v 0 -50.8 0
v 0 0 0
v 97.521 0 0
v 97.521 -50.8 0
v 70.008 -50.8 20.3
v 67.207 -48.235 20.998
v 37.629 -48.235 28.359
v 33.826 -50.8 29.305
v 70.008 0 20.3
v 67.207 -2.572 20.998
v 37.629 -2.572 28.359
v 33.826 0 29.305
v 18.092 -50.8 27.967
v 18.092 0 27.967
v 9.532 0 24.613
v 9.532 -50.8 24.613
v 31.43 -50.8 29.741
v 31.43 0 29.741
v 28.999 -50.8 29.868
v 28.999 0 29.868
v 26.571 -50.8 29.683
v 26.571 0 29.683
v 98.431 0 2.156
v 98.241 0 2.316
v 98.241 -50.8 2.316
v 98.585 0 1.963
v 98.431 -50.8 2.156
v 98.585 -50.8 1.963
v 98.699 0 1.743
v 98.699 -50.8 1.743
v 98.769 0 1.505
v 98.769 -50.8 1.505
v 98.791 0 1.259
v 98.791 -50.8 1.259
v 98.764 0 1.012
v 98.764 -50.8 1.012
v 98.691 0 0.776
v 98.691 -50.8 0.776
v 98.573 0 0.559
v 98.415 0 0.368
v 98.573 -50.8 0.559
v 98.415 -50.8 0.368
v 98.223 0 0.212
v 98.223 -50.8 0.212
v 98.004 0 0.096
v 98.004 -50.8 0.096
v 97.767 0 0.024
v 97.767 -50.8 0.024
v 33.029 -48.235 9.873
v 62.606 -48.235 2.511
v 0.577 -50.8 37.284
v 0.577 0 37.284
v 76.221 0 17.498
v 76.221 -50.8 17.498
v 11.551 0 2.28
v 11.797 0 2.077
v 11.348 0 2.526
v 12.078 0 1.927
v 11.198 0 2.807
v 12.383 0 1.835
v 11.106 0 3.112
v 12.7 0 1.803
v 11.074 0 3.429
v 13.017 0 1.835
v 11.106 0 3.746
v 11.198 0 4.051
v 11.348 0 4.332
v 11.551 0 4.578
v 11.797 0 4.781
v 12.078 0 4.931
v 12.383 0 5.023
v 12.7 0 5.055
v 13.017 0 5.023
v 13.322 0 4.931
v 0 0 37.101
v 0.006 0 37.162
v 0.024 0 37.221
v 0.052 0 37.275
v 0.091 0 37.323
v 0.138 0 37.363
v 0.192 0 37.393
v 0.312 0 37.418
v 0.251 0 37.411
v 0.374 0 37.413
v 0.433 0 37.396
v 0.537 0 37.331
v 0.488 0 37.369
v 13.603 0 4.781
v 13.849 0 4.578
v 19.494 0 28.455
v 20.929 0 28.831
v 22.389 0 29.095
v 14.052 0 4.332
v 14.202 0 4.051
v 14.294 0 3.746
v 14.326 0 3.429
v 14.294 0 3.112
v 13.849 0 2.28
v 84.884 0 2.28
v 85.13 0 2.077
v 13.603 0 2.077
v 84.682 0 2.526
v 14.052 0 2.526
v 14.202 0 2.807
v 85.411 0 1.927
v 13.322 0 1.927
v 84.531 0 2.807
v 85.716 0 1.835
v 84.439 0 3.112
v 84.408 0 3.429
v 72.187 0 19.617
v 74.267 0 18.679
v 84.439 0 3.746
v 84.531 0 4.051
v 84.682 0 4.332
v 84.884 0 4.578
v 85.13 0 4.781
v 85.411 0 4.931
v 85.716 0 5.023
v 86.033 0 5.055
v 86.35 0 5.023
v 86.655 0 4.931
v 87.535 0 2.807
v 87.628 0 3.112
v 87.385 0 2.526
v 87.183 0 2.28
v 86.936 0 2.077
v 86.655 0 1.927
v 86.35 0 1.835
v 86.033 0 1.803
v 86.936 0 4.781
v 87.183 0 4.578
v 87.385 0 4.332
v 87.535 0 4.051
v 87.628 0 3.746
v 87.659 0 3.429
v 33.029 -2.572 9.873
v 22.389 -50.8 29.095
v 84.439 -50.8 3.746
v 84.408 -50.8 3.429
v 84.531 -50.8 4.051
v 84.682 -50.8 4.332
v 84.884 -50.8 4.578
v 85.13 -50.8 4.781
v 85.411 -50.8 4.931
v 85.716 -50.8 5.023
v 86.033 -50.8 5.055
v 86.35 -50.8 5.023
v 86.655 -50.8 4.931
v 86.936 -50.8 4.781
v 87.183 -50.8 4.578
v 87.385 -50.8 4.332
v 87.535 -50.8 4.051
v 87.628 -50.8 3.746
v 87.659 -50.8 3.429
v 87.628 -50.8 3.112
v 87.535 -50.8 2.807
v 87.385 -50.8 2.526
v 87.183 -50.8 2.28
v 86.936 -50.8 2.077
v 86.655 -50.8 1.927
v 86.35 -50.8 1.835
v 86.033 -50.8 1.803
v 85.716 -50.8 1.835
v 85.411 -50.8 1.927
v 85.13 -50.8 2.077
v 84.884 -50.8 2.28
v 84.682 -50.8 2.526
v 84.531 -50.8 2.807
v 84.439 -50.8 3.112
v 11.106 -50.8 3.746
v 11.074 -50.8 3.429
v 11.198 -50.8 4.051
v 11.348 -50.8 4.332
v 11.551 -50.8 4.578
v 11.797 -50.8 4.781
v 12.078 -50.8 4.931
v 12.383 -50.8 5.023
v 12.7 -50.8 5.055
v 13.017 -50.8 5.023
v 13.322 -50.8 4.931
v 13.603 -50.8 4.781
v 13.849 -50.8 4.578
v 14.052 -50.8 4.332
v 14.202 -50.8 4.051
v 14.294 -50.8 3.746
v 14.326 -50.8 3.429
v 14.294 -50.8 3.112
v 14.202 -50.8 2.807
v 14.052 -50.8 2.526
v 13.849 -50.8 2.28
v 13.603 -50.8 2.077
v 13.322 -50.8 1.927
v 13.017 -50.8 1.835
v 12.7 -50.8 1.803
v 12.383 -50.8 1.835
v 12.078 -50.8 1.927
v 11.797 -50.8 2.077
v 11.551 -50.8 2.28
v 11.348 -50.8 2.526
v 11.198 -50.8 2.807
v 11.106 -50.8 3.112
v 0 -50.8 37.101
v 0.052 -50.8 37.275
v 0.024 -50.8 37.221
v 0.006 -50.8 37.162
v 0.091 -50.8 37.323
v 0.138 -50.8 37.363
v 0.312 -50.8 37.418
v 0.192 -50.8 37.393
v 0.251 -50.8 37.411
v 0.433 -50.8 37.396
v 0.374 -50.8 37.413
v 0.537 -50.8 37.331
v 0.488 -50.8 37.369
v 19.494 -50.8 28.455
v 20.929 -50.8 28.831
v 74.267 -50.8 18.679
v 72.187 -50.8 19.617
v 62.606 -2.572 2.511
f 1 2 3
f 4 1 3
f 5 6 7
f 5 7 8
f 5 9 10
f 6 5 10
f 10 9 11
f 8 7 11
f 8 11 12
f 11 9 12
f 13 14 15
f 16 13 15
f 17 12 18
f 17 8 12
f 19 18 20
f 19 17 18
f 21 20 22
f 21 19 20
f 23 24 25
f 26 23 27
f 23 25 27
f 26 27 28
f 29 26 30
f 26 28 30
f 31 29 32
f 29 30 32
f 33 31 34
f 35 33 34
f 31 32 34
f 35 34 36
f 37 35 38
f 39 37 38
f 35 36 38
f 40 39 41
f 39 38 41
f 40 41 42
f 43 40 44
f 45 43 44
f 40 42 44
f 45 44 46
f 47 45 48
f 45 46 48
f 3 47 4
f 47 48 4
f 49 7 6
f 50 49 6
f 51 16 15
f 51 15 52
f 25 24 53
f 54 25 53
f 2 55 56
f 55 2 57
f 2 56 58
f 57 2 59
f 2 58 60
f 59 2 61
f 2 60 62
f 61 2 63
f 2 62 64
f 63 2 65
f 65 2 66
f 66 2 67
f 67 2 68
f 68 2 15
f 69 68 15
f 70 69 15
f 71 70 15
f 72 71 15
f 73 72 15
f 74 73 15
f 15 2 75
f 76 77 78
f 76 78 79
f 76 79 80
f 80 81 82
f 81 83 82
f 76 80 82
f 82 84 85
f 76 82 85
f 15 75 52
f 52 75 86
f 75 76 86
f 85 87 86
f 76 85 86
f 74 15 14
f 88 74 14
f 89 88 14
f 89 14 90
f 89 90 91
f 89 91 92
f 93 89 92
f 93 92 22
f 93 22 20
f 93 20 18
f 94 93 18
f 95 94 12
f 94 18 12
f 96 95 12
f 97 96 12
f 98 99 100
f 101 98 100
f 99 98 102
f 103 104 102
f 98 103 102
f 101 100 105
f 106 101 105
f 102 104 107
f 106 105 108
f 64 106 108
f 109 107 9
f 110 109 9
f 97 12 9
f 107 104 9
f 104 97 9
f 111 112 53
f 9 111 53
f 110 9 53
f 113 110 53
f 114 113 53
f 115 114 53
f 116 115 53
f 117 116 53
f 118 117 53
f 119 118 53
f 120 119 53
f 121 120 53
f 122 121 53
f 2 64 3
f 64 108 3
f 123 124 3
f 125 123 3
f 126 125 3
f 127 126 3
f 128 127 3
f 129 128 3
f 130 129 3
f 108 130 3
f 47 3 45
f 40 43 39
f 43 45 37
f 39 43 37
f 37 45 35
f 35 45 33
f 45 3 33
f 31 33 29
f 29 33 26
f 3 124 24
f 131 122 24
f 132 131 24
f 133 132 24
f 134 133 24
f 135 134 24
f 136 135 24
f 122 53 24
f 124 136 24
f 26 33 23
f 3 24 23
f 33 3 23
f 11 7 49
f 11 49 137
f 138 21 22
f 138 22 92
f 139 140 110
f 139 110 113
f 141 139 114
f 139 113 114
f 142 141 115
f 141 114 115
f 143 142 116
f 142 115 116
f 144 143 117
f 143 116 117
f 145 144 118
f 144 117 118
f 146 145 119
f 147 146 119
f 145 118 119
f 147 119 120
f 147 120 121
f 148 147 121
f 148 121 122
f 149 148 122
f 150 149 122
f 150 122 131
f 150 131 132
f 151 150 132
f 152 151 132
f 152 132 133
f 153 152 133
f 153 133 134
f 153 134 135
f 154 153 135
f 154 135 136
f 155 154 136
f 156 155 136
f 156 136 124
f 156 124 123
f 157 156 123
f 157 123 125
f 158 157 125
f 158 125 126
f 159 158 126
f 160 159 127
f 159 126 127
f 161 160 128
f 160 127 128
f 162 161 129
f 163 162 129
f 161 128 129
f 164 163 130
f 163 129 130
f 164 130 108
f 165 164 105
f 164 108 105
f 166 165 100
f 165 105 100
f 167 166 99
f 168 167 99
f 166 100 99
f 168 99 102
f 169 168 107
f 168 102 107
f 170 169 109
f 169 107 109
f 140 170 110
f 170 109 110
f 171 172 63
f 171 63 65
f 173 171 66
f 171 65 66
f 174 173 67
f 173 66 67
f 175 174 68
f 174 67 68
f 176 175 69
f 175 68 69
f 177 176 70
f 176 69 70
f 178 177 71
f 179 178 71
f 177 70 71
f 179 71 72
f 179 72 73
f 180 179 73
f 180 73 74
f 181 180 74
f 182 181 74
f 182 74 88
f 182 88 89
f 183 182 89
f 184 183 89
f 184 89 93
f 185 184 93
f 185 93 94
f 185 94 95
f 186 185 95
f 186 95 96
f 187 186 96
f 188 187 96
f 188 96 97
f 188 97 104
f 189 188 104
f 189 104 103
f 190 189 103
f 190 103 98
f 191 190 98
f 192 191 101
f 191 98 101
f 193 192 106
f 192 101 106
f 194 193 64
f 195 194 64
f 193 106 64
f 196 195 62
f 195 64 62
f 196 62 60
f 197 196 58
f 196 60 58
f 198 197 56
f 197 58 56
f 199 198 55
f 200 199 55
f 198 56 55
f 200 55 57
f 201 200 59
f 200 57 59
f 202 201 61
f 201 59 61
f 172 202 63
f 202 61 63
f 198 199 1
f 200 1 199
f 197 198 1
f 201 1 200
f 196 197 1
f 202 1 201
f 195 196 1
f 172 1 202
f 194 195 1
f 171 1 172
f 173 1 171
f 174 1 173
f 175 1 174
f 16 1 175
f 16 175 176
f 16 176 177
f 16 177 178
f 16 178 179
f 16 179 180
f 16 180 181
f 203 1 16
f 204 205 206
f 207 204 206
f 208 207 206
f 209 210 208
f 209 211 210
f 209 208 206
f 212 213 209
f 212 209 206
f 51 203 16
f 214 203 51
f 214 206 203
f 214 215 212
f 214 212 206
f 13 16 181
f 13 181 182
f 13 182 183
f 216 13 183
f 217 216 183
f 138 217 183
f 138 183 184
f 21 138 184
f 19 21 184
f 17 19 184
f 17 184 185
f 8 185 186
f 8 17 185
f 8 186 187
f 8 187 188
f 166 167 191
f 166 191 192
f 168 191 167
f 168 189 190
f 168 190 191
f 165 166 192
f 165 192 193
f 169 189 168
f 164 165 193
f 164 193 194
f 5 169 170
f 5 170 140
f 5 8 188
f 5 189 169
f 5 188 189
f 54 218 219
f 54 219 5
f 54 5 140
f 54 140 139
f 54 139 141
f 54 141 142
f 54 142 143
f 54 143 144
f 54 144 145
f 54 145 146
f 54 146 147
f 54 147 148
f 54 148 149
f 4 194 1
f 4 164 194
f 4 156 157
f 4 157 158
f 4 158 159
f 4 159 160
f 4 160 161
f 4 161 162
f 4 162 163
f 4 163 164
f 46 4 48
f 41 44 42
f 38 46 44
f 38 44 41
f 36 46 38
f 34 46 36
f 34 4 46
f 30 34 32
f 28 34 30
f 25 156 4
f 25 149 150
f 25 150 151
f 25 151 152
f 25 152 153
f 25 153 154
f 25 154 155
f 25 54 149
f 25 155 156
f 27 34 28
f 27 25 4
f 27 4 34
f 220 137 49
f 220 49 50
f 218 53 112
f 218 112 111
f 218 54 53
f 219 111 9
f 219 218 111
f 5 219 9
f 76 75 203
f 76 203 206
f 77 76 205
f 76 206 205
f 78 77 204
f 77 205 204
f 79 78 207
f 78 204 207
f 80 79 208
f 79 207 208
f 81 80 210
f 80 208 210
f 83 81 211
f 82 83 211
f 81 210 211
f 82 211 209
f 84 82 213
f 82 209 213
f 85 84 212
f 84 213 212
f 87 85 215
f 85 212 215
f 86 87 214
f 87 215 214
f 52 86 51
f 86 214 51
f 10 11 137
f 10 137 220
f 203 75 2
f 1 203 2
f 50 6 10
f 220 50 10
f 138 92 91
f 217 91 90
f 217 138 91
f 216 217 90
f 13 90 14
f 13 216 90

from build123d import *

# Parameters (mm, degrees)
F1_DEPTH = 50.8
F2_R     = 19.05
F3_R     = 1.27
F4_W     = 30.48
F4_H     = 45.66285
F5_DEPTH = 19.05
F7_D     = 3.2512
F8_R     = 0.3175


with BuildPart() as f1:
    # F0 (on Front) → F1 (new body)
    with BuildSketch(Plane.XZ):
        Polygon((0, 38.1), (0, 0), (101.6, 0), (73.369475, 19.463853), (30.235227, 30.198802), (20.174297, 28.783426), (9.532238, 24.613116), align=None)
    extrude(amount=F1_DEPTH)

    # F2
    f2_edges = [f1.edges().sort_by_distance(p)[0] for p in [
        (30.235227, -25.4, 30.198802),
        (73.369475, -25.4, 19.463853),
        (20.174297, -25.4, 28.783426),
    ]]
    fillet(f2_edges, radius=F2_R)

    # F3
    f3_edges = [f1.edges().sort_by_distance(p)[0] for p in [
        (101.6, -25.4, 0),
    ]]
    fillet(f3_edges, radius=F3_R)

    # F4 (on face) → F5 (cut)
    with BuildSketch(Plane(origin=(8.84079, 0, 35.5233), x_dir=(0.970399, 0, -0.241506), z_dir=(0.241506, 0, 0.970399))):
        with Locations((44.906641, -25.403175)):
            Rectangle(F4_W, F4_H)
    extrude(amount=-F5_DEPTH, mode=Mode.SUBTRACT)

    # F7 (through all)
    with Locations(Plane.XZ.offset(50.8)):
        with Locations((12.7, 3.429), (86.033185, 3.429)):
            Hole(F7_D / 2)

    # F8
    f8_edges = [f1.edges().sort_by_distance(p)[0] for p in [
        (0, -25.4, 38.1),
    ]]
    fillet(f8_edges, radius=F8_R)


solid = f1.part
